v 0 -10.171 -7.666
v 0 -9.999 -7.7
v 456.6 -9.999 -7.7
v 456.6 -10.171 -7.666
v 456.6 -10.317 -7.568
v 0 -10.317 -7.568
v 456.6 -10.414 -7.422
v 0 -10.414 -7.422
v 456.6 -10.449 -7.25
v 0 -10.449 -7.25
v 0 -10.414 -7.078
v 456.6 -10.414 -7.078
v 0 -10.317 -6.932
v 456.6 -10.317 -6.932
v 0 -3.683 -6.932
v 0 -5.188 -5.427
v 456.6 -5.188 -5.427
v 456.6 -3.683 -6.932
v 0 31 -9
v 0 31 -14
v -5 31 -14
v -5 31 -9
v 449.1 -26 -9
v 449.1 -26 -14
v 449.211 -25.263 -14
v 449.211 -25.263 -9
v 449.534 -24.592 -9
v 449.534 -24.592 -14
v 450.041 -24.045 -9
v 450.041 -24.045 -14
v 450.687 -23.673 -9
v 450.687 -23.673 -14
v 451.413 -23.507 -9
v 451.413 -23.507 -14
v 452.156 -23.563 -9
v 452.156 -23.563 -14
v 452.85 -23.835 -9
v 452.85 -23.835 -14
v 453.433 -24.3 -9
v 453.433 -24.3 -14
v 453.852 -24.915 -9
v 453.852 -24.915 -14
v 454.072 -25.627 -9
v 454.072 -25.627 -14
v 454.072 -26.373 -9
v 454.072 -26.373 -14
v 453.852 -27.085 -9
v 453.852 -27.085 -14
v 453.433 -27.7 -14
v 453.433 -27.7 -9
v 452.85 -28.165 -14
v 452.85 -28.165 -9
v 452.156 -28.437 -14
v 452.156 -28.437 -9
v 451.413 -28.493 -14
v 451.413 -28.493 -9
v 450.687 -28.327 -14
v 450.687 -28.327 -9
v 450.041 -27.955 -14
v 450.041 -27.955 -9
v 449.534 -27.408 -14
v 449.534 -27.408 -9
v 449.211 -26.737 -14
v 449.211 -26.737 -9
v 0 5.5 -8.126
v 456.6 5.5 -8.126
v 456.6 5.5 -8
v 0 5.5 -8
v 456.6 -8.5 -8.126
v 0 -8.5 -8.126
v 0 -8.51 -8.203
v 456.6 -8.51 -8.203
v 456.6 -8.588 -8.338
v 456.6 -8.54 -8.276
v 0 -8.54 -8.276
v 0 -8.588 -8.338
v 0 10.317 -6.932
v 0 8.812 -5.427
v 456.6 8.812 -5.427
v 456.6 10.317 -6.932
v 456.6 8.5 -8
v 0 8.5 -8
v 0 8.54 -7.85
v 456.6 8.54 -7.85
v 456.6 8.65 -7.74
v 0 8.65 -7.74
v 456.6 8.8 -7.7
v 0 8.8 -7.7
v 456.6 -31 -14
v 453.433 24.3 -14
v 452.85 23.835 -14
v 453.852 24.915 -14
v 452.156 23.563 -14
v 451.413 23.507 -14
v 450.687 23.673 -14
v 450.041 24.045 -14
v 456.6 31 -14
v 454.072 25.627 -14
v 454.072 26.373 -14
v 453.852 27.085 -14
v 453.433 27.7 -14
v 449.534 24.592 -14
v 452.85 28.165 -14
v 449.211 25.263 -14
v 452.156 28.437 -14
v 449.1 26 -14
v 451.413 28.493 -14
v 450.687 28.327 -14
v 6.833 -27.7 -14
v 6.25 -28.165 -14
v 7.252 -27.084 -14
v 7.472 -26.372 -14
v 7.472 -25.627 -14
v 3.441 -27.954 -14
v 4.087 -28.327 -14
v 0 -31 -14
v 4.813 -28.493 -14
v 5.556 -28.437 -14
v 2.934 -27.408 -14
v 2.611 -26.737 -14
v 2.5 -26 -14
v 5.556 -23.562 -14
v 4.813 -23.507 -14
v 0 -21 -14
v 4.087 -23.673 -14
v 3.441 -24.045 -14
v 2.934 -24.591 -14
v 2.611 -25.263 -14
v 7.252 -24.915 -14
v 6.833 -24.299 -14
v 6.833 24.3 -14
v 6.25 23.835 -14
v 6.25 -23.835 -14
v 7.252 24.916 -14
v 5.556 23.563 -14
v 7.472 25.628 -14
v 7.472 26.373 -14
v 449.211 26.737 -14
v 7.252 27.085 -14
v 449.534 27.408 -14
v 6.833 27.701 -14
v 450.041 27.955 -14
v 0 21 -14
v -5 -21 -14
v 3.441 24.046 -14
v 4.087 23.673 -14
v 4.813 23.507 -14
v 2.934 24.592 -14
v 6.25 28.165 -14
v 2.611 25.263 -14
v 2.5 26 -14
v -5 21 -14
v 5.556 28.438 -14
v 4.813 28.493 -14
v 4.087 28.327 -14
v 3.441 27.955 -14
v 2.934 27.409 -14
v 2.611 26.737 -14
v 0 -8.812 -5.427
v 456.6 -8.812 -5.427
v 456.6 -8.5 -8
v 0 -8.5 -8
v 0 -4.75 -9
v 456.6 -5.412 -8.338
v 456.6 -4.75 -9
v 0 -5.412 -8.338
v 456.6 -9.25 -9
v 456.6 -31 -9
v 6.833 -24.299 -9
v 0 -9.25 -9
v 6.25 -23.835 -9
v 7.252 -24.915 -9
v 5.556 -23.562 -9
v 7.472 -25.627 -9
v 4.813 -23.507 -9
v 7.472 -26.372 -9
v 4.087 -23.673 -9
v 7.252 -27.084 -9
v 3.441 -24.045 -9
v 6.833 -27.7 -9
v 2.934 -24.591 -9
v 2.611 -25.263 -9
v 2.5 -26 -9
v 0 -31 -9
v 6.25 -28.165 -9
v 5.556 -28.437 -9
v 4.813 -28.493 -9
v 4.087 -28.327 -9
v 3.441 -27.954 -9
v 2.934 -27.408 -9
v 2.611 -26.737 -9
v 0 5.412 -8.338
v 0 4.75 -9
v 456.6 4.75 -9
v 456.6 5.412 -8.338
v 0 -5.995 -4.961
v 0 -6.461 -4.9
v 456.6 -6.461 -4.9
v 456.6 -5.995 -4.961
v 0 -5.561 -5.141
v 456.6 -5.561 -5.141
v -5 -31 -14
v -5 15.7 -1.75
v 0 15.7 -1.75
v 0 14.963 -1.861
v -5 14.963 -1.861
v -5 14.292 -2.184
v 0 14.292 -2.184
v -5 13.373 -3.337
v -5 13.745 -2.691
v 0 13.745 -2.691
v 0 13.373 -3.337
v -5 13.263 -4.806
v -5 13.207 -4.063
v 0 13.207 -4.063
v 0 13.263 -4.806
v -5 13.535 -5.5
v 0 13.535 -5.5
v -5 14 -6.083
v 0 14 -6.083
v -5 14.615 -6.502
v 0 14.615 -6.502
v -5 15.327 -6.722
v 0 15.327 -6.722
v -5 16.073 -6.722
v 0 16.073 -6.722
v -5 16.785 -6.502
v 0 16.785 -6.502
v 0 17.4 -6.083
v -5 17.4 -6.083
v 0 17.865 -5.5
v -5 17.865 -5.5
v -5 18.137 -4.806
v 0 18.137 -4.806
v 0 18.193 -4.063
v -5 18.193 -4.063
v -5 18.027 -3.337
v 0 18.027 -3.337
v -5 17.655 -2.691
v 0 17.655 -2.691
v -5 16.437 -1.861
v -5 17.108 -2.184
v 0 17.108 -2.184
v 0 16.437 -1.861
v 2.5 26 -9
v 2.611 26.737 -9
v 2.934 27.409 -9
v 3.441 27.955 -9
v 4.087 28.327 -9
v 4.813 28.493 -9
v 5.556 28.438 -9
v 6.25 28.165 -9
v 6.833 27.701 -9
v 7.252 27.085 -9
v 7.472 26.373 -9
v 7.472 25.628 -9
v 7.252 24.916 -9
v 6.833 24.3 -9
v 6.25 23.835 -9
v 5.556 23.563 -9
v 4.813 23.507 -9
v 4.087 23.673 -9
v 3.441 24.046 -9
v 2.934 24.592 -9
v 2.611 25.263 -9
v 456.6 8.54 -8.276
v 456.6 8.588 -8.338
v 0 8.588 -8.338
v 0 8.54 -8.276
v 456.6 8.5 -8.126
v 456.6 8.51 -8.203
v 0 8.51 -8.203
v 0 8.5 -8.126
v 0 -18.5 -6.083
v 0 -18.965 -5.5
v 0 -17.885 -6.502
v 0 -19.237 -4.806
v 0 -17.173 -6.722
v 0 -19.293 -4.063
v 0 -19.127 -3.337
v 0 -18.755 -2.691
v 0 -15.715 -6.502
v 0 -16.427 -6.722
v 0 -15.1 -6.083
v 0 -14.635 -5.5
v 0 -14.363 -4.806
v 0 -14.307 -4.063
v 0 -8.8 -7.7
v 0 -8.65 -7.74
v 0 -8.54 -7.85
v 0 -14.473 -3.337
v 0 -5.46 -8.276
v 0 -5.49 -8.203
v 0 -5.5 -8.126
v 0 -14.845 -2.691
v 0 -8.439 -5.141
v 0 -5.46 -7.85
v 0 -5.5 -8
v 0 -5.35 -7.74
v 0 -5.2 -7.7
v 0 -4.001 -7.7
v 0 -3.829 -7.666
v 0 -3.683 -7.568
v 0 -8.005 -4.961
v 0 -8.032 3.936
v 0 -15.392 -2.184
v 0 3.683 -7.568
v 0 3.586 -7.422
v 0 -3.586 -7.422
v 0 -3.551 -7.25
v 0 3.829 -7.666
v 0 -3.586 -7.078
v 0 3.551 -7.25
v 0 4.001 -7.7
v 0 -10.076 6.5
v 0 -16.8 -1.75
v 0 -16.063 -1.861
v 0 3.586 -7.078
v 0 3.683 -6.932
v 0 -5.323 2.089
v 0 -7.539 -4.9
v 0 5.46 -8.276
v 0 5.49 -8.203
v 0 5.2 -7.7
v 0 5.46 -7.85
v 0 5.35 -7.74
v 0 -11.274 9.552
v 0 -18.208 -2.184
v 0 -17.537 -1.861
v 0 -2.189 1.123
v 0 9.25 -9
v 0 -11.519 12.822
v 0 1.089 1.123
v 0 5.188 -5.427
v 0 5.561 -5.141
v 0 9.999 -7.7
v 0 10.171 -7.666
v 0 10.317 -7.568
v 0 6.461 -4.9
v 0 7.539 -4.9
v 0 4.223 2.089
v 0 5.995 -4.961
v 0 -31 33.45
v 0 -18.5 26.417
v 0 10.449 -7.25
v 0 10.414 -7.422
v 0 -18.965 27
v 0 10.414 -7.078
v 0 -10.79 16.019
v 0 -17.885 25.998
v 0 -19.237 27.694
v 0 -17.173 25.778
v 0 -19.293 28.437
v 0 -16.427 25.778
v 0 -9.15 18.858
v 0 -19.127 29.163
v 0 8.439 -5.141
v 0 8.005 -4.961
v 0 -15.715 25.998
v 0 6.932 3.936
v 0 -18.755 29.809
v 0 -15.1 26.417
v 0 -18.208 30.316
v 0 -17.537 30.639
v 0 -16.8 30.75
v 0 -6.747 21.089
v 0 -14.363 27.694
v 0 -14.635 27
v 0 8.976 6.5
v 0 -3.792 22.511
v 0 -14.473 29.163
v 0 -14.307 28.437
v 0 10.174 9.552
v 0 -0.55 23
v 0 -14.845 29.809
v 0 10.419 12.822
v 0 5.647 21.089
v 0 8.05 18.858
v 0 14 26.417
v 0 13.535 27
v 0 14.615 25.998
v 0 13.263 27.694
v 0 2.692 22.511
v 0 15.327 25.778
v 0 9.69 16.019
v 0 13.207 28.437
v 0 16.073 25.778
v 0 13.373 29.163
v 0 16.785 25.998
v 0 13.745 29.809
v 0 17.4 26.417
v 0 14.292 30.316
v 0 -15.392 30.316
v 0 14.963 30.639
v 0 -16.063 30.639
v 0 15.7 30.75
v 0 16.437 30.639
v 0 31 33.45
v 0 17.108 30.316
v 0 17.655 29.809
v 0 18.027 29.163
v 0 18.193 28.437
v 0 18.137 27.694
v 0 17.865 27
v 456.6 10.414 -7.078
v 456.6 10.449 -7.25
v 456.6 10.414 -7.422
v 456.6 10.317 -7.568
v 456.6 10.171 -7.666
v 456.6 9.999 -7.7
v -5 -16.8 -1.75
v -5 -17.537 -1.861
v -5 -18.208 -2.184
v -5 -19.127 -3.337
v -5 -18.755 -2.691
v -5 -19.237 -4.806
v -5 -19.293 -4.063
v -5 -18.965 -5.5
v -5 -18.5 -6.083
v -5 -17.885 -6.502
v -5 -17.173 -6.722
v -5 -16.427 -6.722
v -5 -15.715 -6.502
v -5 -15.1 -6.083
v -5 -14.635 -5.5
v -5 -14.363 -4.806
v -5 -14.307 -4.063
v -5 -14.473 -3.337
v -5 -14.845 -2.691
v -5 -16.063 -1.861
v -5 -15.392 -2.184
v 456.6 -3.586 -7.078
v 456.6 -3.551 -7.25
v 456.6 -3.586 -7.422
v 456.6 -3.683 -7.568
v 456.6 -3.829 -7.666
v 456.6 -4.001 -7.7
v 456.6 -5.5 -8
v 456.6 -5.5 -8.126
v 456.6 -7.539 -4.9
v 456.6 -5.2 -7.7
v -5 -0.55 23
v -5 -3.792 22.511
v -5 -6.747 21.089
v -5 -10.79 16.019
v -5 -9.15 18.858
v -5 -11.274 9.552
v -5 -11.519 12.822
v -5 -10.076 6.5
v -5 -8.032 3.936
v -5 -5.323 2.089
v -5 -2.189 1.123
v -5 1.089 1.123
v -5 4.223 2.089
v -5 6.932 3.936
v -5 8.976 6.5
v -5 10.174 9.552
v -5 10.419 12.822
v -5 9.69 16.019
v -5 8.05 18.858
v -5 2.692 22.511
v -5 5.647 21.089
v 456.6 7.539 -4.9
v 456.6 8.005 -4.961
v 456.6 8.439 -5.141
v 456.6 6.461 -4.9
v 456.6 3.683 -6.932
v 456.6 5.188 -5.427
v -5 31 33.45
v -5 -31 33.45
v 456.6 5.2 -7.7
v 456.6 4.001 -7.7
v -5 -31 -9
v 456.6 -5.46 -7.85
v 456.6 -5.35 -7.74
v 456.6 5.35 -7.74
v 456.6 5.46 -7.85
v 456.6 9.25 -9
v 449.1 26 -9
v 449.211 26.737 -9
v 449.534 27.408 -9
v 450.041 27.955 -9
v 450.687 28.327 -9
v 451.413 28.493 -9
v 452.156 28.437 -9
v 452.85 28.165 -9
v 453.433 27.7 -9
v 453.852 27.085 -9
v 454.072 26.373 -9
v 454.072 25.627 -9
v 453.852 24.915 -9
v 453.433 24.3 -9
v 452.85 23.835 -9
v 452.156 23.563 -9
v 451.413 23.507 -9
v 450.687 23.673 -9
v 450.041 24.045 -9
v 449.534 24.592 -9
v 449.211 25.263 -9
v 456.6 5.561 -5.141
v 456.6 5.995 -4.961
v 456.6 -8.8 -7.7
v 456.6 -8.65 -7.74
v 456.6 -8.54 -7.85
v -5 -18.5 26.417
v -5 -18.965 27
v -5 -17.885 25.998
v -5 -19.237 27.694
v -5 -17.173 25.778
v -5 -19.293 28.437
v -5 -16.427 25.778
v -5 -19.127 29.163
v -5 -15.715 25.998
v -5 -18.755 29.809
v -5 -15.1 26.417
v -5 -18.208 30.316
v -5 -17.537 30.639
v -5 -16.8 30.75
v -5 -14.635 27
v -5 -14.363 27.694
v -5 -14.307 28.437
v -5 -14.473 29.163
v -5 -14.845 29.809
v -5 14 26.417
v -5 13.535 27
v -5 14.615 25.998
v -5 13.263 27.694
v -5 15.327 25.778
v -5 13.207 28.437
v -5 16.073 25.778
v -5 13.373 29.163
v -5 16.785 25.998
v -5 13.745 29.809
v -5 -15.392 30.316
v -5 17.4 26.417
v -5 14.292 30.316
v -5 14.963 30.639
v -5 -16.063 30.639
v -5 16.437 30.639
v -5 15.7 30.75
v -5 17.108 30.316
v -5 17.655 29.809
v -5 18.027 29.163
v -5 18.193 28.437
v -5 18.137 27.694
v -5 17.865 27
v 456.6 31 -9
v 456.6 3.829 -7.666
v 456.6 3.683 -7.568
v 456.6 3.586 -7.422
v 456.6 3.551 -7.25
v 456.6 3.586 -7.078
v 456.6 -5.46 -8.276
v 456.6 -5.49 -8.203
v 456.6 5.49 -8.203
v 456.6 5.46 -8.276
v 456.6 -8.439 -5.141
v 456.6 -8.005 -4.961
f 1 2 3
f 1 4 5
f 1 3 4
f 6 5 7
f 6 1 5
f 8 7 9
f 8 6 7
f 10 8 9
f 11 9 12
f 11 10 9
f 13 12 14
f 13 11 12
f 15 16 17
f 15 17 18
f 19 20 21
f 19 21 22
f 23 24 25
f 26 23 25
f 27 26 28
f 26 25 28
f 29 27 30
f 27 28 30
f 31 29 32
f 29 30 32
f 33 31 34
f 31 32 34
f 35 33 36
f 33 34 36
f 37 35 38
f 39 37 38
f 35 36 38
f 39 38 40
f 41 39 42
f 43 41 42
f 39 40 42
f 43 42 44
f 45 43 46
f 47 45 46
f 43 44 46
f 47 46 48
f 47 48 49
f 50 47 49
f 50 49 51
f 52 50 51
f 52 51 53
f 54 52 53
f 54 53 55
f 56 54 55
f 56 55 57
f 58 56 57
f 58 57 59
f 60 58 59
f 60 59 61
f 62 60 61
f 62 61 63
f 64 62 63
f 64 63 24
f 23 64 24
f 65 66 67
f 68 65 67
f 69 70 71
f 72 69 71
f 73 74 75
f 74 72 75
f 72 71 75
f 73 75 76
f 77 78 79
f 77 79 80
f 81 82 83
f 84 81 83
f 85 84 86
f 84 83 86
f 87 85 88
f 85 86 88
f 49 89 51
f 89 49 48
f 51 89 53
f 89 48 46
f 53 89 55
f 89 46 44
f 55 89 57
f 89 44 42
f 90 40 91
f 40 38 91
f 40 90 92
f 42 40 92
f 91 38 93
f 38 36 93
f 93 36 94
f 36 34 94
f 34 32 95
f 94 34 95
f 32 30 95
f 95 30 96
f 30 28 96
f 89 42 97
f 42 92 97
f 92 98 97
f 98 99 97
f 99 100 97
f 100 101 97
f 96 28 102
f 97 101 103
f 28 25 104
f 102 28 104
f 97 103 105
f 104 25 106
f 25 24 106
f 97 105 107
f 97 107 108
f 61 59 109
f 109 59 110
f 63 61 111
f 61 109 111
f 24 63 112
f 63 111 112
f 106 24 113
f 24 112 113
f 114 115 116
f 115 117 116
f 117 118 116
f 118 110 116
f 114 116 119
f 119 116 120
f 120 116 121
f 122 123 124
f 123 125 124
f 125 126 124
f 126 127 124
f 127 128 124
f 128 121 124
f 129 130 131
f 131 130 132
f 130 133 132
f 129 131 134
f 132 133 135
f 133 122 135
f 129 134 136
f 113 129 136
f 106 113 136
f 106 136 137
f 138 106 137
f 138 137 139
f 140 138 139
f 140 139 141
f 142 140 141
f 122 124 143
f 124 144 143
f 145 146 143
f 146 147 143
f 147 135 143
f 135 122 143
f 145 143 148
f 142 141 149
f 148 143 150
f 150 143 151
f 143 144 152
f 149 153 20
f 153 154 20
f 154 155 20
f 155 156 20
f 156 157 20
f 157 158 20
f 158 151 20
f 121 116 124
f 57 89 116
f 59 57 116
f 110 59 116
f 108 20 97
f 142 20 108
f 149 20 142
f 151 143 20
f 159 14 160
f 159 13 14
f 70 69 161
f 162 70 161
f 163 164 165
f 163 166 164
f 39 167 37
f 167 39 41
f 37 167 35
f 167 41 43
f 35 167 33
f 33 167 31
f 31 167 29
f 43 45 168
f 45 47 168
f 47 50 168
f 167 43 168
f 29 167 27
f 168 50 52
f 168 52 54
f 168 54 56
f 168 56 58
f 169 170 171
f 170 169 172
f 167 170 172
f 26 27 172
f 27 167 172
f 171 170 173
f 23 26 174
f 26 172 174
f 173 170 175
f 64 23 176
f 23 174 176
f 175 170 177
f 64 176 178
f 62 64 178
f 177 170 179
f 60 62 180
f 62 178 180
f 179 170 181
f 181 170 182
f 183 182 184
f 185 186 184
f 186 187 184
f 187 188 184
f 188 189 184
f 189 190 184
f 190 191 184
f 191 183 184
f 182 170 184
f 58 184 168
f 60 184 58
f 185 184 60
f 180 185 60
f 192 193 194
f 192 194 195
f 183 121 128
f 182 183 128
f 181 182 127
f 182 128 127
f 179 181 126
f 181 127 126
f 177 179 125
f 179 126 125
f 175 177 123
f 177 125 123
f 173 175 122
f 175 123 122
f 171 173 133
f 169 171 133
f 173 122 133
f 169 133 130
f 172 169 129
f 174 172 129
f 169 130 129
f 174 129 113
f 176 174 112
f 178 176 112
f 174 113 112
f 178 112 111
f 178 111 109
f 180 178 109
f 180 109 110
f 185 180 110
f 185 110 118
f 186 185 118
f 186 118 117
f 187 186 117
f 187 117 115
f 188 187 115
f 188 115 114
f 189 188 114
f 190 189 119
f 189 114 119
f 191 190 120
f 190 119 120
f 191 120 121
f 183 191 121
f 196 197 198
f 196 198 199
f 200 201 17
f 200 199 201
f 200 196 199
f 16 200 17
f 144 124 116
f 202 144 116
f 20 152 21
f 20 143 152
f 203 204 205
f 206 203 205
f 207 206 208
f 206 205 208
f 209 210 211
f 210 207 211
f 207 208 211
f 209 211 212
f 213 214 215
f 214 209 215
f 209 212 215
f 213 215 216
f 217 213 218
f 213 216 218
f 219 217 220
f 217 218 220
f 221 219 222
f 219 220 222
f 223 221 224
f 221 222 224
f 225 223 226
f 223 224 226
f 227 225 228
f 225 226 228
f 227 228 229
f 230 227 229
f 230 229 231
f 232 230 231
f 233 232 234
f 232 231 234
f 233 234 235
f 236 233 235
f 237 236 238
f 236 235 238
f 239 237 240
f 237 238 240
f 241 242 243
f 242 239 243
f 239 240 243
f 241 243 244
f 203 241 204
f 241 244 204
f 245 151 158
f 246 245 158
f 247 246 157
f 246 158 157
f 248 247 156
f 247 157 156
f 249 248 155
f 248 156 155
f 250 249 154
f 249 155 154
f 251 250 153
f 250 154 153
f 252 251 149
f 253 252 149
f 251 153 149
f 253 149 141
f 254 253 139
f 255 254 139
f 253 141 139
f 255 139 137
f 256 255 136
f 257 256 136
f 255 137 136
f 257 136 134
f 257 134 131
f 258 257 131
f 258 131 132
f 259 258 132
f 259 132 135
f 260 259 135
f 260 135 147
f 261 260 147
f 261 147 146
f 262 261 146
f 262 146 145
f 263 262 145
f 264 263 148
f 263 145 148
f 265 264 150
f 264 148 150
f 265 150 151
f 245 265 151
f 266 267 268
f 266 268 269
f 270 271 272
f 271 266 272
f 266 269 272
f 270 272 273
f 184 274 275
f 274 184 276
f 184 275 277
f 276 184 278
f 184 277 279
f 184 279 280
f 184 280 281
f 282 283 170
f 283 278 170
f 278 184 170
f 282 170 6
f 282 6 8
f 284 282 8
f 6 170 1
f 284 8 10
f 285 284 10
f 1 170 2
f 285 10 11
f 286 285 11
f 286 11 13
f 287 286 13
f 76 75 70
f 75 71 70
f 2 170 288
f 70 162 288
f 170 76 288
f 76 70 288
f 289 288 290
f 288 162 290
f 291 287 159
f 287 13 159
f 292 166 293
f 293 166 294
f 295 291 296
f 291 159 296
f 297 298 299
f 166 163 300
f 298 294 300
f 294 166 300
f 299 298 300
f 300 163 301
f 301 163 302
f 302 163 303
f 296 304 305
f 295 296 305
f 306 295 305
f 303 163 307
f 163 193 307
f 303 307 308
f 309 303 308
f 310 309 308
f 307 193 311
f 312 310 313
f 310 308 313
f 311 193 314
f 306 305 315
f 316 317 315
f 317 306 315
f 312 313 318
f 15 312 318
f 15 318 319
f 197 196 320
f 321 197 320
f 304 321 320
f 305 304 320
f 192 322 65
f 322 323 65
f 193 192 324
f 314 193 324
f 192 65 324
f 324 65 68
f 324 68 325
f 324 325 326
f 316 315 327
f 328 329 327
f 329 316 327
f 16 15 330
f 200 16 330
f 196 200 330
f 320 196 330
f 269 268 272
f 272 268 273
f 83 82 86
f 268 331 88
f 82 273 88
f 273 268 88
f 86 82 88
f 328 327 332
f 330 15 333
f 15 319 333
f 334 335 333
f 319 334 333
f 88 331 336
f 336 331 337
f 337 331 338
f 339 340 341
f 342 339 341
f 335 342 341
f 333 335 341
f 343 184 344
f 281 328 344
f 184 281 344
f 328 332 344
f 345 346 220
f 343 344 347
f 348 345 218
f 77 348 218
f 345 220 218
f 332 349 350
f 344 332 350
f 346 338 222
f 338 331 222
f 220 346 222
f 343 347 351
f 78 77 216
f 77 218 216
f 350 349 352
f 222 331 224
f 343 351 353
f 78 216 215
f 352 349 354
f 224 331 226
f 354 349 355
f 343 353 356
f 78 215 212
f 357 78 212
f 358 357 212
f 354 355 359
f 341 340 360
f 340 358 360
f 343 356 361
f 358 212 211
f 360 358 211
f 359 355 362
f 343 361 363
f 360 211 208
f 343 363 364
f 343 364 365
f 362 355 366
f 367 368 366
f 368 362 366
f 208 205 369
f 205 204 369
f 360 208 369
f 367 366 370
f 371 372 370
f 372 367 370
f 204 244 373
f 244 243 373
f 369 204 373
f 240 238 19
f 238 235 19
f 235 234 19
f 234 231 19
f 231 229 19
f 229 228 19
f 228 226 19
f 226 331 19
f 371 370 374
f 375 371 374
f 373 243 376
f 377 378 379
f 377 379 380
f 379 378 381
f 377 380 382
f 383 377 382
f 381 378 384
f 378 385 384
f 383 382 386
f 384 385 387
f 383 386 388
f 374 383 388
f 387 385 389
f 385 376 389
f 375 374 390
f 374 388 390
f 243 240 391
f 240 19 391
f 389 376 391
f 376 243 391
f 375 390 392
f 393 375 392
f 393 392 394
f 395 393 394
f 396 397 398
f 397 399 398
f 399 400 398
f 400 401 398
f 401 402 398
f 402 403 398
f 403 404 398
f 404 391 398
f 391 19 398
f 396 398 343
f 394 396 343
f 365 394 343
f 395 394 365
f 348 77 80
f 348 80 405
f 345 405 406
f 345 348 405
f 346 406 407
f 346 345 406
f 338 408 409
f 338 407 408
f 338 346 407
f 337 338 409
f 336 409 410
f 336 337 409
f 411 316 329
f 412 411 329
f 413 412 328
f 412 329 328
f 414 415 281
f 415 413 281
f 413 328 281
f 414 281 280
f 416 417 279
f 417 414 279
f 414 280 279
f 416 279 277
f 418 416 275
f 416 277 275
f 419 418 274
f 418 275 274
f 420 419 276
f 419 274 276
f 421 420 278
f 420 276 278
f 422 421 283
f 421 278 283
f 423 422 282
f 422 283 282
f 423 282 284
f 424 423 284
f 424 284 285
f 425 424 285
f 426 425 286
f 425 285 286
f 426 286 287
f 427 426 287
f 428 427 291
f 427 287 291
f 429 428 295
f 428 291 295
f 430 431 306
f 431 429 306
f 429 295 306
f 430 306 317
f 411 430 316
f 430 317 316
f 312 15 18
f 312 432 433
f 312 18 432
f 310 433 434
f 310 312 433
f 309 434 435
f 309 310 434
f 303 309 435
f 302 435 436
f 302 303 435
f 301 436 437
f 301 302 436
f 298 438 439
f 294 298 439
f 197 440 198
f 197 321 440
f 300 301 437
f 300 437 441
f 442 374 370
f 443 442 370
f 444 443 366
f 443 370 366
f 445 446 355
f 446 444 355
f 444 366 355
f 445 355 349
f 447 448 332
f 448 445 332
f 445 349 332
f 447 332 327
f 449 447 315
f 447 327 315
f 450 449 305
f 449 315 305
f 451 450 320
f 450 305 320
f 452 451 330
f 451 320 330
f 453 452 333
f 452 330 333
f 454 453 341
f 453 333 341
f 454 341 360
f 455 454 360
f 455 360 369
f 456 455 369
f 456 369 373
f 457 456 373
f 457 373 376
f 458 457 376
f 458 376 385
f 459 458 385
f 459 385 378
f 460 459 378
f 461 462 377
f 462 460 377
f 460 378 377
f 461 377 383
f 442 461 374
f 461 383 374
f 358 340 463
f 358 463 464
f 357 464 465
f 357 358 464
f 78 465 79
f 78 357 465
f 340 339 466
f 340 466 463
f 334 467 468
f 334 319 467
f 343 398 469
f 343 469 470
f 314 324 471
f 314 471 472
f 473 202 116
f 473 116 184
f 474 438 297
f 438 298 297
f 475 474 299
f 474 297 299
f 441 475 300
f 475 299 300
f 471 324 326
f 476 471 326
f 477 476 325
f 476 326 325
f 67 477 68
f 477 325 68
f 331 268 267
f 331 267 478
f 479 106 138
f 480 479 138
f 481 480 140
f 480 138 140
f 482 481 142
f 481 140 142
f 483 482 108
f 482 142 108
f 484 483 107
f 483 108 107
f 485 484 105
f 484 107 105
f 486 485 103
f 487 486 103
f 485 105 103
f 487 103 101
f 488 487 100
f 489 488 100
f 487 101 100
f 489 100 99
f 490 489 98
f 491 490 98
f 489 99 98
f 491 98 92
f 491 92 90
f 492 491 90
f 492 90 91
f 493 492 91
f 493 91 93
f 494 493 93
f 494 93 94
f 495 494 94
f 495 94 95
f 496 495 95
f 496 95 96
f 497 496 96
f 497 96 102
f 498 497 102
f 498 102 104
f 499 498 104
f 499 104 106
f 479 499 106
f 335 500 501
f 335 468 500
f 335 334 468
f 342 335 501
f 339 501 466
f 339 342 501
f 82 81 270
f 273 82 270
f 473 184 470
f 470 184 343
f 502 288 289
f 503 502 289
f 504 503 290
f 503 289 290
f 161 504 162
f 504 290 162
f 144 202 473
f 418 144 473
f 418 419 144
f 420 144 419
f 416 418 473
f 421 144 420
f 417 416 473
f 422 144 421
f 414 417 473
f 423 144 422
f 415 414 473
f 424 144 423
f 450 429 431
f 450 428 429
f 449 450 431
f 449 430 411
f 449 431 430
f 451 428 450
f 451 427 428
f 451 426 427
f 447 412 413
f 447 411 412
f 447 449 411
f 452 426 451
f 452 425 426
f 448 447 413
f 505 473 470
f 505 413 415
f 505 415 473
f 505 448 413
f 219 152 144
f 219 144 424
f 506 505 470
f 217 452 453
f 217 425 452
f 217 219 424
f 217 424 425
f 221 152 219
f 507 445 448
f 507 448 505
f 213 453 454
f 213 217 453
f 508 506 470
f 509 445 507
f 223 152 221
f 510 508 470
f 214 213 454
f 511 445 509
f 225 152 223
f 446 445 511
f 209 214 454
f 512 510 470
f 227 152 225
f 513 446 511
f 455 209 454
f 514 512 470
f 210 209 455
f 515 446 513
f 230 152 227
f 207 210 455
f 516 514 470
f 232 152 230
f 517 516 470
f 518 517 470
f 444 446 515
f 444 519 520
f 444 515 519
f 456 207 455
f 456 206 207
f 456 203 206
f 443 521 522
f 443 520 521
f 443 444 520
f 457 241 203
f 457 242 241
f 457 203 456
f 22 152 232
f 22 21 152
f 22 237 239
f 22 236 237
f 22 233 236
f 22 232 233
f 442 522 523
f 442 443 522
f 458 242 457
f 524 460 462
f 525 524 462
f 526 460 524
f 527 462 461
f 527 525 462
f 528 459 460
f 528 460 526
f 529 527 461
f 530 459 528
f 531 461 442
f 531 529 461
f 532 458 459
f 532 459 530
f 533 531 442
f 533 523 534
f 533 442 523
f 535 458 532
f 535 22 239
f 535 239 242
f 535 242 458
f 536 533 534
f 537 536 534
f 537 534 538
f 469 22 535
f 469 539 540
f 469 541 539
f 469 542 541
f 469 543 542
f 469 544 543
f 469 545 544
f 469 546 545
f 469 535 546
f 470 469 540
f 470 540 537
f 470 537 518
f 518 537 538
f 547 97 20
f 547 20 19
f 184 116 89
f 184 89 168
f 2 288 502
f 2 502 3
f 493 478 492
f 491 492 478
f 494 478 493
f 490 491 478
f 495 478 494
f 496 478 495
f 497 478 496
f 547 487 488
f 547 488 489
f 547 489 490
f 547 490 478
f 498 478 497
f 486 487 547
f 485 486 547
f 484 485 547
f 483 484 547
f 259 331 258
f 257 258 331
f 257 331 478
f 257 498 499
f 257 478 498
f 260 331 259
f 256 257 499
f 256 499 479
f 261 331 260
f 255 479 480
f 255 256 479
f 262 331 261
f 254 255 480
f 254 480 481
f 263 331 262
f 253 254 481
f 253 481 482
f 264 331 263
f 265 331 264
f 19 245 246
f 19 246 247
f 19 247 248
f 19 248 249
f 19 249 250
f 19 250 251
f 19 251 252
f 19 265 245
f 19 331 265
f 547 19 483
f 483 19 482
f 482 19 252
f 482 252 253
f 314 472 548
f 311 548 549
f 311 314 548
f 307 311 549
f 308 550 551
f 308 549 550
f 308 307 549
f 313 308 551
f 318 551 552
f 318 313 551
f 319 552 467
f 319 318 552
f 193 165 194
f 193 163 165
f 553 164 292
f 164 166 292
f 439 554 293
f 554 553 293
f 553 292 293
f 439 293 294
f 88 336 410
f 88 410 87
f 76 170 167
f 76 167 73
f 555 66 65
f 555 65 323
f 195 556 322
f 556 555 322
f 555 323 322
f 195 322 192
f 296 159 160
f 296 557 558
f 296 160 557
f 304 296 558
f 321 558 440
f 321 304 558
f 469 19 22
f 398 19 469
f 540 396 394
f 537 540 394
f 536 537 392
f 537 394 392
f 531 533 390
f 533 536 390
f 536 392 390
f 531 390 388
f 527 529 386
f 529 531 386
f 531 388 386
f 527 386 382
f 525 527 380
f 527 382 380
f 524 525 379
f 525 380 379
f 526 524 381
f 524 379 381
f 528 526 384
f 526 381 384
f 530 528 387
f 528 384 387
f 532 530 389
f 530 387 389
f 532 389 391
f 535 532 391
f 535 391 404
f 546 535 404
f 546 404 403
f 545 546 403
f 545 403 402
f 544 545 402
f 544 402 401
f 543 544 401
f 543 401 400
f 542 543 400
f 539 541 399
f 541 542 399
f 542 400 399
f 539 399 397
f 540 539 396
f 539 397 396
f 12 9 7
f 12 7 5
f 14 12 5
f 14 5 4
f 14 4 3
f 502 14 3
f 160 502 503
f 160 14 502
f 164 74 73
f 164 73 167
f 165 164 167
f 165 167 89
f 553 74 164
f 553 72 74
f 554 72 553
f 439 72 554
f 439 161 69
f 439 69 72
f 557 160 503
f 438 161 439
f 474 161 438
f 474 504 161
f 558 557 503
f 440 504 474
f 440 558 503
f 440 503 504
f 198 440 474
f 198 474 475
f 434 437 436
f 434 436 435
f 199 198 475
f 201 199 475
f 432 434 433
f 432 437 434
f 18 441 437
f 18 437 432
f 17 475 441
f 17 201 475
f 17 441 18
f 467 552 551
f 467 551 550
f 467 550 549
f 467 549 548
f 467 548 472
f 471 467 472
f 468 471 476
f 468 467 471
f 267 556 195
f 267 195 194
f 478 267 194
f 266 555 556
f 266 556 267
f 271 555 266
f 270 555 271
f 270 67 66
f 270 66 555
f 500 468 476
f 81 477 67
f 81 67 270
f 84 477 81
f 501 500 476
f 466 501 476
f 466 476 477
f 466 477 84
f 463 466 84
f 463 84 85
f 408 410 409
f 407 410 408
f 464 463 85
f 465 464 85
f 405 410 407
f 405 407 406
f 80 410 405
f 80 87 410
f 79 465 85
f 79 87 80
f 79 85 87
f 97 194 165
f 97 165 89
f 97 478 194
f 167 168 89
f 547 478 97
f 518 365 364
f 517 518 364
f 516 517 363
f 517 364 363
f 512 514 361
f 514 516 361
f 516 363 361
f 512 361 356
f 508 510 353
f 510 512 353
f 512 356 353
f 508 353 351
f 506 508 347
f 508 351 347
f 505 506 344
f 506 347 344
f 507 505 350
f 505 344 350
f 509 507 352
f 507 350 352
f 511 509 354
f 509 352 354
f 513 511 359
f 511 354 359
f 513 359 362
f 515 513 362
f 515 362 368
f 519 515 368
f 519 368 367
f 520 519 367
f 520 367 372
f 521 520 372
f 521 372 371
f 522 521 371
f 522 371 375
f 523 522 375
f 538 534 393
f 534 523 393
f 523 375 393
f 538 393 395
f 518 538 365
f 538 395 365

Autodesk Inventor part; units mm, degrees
ref_plane "YZ Plane" through (0, 0, 0) normal (1, 0, 0) x (0, 1, 0)
ref_plane "XZ Plane" through (0, 0, 0) normal (0, 1, 0) x (-1, 0, 0)
ref_plane "XY Plane" through (0, 0, 0) normal (0, 0, 1) x (1, 0, 0)
sketch "Sketch1" plane through (0, 0, 0) normal (1, 0, 0) x (0, 1, 0)
  arc A0 (8.8122, -5.4272) -> (7.5394, -4.9) centre (7.5394, -6.7) ccw
  line L0 (8.8122, -5.4272) -> (10.3168, -6.9318)
  arc A1 (9.9986, -7.7) -> (10.3168, -6.9318) centre (9.9986, -7.25) ccw
  line L1 (9.9986, -7.7) -> (8.8, -7.7)
  arc A2 (8.8, -7.7) -> (8.5, -8) centre (8.8, -8) ccw
  line L2 (8.5, -8) -> (8.5, -8.1257)
  arc A3 (8.5, -8.1257) -> (8.5879, -8.3379) centre (8.8, -8.1257) ccw
  line L3 (8.5879, -8.3379) -> (9.25, -9)
  line L4 (9.25, -9) -> (18, -9)
  line L5 (4.75, -9) -> (5.4121, -8.3379)
  arc A4 (5.4121, -8.3379) -> (5.5, -8.1257) centre (5.2, -8.1257) ccw
  line L6 (5.5, -8.1257) -> (5.5, -8)
  arc A5 (5.5, -8) -> (5.2, -7.7) centre (5.2, -8) ccw
  line L7 (5.2, -7.7) -> (4.0014, -7.7)
  arc A6 (3.6832, -6.9318) -> (4.0014, -7.7) centre (4.0014, -7.25) ccw
  line L8 (3.6832, -6.9318) -> (5.1878, -5.4272)
  arc A7 (6.4606, -4.9) -> (5.1878, -5.4272) centre (6.4606, -6.7) ccw
  line L9 (6.4606, -4.9) -> (7.5394, -4.9)
  line L10 (-4.75, -9) -> (4.75, -9)
  line L11 (-5.4121, -8.3379) -> (-4.75, -9)
  arc A8 (-5.5, -8.1257) -> (-5.4121, -8.3379) centre (-5.2, -8.1257) ccw
  arc A9 (-5.2, -7.7) -> (-5.5, -8) centre (-5.2, -8) ccw
  line L12 (-4.0014, -7.7) -> (-5.2, -7.7)
  arc A10 (-4.0014, -7.7) -> (-3.6832, -6.9318) centre (-4.0014, -7.25) ccw
  line L13 (-5.1878, -5.4272) -> (-3.6832, -6.9318)
  arc A11 (-5.1878, -5.4272) -> (-6.4606, -4.9) centre (-6.4606, -6.7) ccw
  line L14 (-7.5394, -4.9) -> (-6.4606, -4.9)
  arc A12 (-7.5394, -4.9) -> (-8.8122, -5.4272) centre (-7.5394, -6.7) ccw
  line L15 (-10.3168, -6.9318) -> (-8.8122, -5.4272)
  line L16 (-18, -9) -> (-9.25, -9)
  line L17 (-9.25, -9) -> (-8.5879, -8.3379)
  line L18 (-5.5, -8) -> (-5.5, -8.1257)
  line L19 (-8.5, -8.1257) -> (-8.5, -8)
  arc A13 (-8.5879, -8.3379) -> (-8.5, -8.1257) centre (-8.8, -8.1257) ccw
  arc A14 (-8.5, -8) -> (-8.8, -7.7) centre (-8.8, -8) ccw
  line L20 (-8.8, -7.7) -> (-9.9986, -7.7)
  arc A15 (-10.3168, -6.9318) -> (-9.9986, -7.7) centre (-9.9986, -7.25) ccw
  line L21 (18, -9) -> (21, -9)
  line L22 (21, -9) -> (21, -14)
  line L23 (-18, -9) -> (-21, -9)
  line L24 (-21, -9) -> (-21, -14)
  line L25 (-21, -14) -> (21, -14)
  line L26 (21, -14) -> (31, -14)
  line L27 (31, -14) -> (31, -9)
  line L28 (31, -9) -> (21, -9)
  line L29 (-21, -14) -> (-31, -14)
  line L30 (-31, -14) -> (-31, -9)
  line L31 (-31, -9) -> (-21, -9)
  line L32 (-21, -14) -> (-21, -9)
  line L33 (21, -14) -> (21, -9)
  point P0 (0, 0)
  dimension "d0" = 5
  dimension "d7" = 10
  dimension "d9" = 10
extrude "Extrusion1" add sketch "Sketch1" along normal blind 456.6 contours L0 A1 L1 A2 L2 A3 L3 L4 L21 L22 L25 L24 L23 L16 L17 A13 L19 A14 L20 A15 L15 A12 L14 A11 L13 A10 L12 A9 L18 A8 L11 L10 L5 A4 L6 A5 L7 A6 L8 A7 L9 A0
sketch "Sketch2" plane through (0, 0, 0) normal (-1, 0, 0) x (0, 0, 1)
  circle A0 centre (-4.25, 15.7) radius 2.5
  circle A1 centre (28.25, 15.7) radius 2.5
  circle A2 centre (12, -0.55) radius 11
  circle A3 centre (28.25, -16.8) radius 2.5
  circle A4 centre (-4.25, -16.8) radius 2.5
  line L0 (-14, -21) -> (-14, 21) projected
  line L1 (-14, -21) -> (-9, -21)
  line L2 (-9, 21) -> (-14, 21)
  line L3 (-14, 21) -> (-14, -21)
  line L4 (33.45, 21) -> (33.45, -21)
  line L5 (33.45, -21) -> (-9.45, -21)
  line L6 (-9.45, 21) -> (33.45, 21)
  line L7 (-9, -9.25) -> (-9, -21) projected
  line L8 (33.45, -21) -> (-9, -21)
  line L9 (-13.9998, -20.9997) -> (-13.9998, -30.9997)
  line L10 (-9, -31) -> (33.45, -31)
  line L11 (33.45, -31) -> (33.45, -21)
  line L12 (33.45, 21) -> (-9, 21)
  line L13 (-14, 21) -> (-9, 21) projected
  line L14 (-13.9998, 21.0003) -> (-13.9998, 31.0003)
  line L15 (-9, 31) -> (33.45, 31)
  line L16 (33.45, 31) -> (33.45, 21)
  line L17 (-13.9998, -30.9997) -> (33.45, -30.9997)
  line L18 (33.45, -30.9997) -> (33.45, -21)
  line L19 (33.45, -21) -> (-13.9998, -21)
  line L20 (-13.9998, -21) -> (-13.9998, -30.9997)
  line L21 (33.45, 21) -> (-13.9998, 21)
  line L22 (-13.9998, 21) -> (-13.9998, 31.0003)
  line L23 (-13.9998, 31.0003) -> (33.45, 31.0003)
  line L24 (33.45, 31.0003) -> (33.45, 21)
  point P0 (12, -11.55)
  point P1 (-14, 21)
  point P2 (-13.9998, -21)
  dimension "d12" = 11.18
  dimension "d13" = 11.1805
extrude "Extrusion2" add sketch "Sketch2" along normal blind 5 contours L0 L2 L6 L4 L5 L1
extrude "Extrusion3" add sketch "Sketch1" along normal up to surface (456.6 mm away) contours L28 L27 L26 L22 | L29 L30 L31 L24
extrude "Extrusion4" add sketch "Sketch2" along normal up to surface (5 mm away) contours L1 L5 L11 L10 L17 L9 | L14 L23 L15 L16 L6 L2
sketch "Sketch3" plane through (-5, -21, -14) normal (0, 0, -1) x (-1, 0, 0)
  line L0 (-461.6, -10) -> (-461.6, 0) projected
  line L1 (-461.6, -10) -> (-451.6, -10)
  line L2 (-451.6, -10) -> (-451.6, 0)
  line L3 (-451.6, 0) -> (-461.6, 0)
  line L4 (-461.6, 0) -> (-461.6, -10)
  line L5 (-5, -10) -> (-461.6, -10) projected
  line L6 (-461.6, -10) -> (-451.6, 0)
  line L7 (-5, 0) -> (-461.6, 0) projected
  line L8 (-461.6, 0) -> (-451.6, -10)
  circle A0 centre (-456.6, -5) radius 2.5
  line L9 (-5, 52) -> (-461.6, 52) projected
  line L10 (-461.6, 52) -> (-451.6, 52)
  line L11 (-451.6, 52) -> (-451.6, 42)
  line L12 (-451.6, 42) -> (-461.6, 42)
  line L13 (-461.6, 42) -> (-461.6, 52)
  line L14 (-461.6, 42) -> (-451.6, 52)
  line L15 (-461.6, 52) -> (-451.6, 42)
  circle A1 centre (-456.6, 47) radius 2.5
  line L16 (0, -9.9997) -> (0, 0) projected
  line L17 (0, -9.9997) -> (-20, -9.9997)
  line L18 (-20, -9.9997) -> (-20, 0.0003)
  line L19 (-20, 0.0003) -> (0, 0.0003)
  line L20 (0, 0.0003) -> (0, -9.9997)
  line L21 (-5, 0) -> (0, 0) projected
  line L22 (-20, -9.9997) -> (0, 0)
  line L23 (0, 0) -> (-20, 0.0003)
  line L24 (-20, 0.0003) -> (0, -9.9997)
  circle A2 centre (-10, -4.9997) radius 2.5
  line L25 (0, 52.0003) -> (0, -9.9997) projected
  line L26 (0, 52.0003) -> (-20, 52.0003)
  line L27 (-20, 52.0003) -> (-20, 42.0003)
  line L28 (-20, 42.0003) -> (0, 42.0003)
  line L29 (0, 42.0003) -> (0, 52.0003)
  line L30 (-20, 42.0003) -> (0, 52.0003)
  line L31 (-20, 52.0003) -> (0, 42.0003)
  circle A3 centre (-10, 47.0003) radius 2.5
  point P0 (-5, 21)
  dimension "d22" = 10
  dimension "d23" = 10
  dimension "d24" = 5
  dimension "d25" = 10
  dimension "d26" = 10
  dimension "d27" = 5
  dimension "d28" = 20
  dimension "d29" = 10
  dimension "d30" = 5
  dimension "d31" = 20
  dimension "d32" = 10
  dimension "d33" = 5
extrude "Extrusion5" cut sketch "Sketch3" against normal through all contours A0 L8 L6 | L6 L8 A0 | A0 L6 L8 | L8 L6 A0 | A2 L24 L22 | L22 L24 A2 | A2 L22 L24 | L22 A2 L24 | A3 L30 L31 | L31 L30 A3 | L30 L31 A3 | A3 L31 L30 | A1 L15 L14 | L14 L15 A1 | L15 L14 A1 | A1 L14 L15
properties part number "SoporteElectromecánico" material "Steel, Mild, Welded"
